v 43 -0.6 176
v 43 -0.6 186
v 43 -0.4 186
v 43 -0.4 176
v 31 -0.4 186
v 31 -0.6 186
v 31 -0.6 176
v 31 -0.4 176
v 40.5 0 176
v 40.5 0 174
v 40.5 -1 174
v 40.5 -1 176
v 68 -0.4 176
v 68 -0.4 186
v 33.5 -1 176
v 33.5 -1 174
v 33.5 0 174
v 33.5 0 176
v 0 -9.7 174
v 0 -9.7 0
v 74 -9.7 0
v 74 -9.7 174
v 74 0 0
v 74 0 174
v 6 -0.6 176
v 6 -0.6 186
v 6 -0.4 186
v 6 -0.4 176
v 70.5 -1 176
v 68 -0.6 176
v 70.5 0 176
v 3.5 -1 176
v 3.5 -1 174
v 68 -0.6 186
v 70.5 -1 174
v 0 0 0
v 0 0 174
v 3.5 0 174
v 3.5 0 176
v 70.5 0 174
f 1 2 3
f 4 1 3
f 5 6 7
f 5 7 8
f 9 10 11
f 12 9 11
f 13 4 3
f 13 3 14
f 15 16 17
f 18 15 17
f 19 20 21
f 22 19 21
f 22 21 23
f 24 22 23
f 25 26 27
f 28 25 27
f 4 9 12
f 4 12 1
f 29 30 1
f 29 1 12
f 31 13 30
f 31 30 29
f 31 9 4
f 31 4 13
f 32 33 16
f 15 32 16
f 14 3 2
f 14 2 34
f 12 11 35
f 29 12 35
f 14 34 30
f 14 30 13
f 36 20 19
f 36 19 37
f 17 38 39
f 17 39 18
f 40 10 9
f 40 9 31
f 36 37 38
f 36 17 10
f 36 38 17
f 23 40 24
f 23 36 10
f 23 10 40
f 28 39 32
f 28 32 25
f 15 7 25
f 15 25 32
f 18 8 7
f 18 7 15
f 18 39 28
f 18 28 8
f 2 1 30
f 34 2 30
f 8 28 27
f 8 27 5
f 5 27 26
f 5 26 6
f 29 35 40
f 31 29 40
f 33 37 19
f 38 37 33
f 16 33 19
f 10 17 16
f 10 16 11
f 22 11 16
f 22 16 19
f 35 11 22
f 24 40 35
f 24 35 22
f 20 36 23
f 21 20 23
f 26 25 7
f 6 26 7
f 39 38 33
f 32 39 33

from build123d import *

# Parameters (mm, degrees)
SZKIC1_W                    = 74
SZKIC1_H                    = 9.7
DODANIE_WYCI_GNI_CIE1_DEPTH = 174
DODANIE_WYCI_GNI_CIE2_DEPTH = 2
SZKIC3_W                    = 25
SZKIC3_H                    = 0.2
DODANIE_WYCI_GNI_CIE3_DEPTH = 10
SZKIC4_W                    = 25
SZKIC4_H                    = 0.2
DODANIE_WYCI_GNI_CIE4_DEPTH = 10


with BuildPart() as part:
    # Szkic1 → Dodanie-wyciągnięcie1 (new body)
    with BuildSketch(Plane.XY):
        with Locations((37, -4.85)):
            Rectangle(SZKIC1_W, SZKIC1_H)
    extrude(amount=DODANIE_WYCI_GNI_CIE1_DEPTH)

    # Szkic2 → Dodanie-wyciągnięcie2 (add)
    with BuildSketch(Plane.XY.offset(174)):
        Polygon((3.5, 0), (3.5, -1), (33.5, -1), (33.5, 0), (18.5, 0), align=None)
        Polygon((40.5, 0), (40.5, -1), (70.5, -1), (70.5, 0), (55.5, 0), align=None)
    extrude(amount=DODANIE_WYCI_GNI_CIE2_DEPTH)

    # Szkic3 → Dodanie-wyciągnięcie3 (add)
    with BuildSketch(Plane.XY.offset(176)):
        with Locations((18.5, -0.5)):
            Rectangle(SZKIC3_W, SZKIC3_H)
    extrude(amount=DODANIE_WYCI_GNI_CIE3_DEPTH)

    # Szkic4 → Dodanie-wyciągnięcie4 (add)
    with BuildSketch(Plane.XY.offset(176)):
        with Locations((55.5, -0.5)):
            Rectangle(SZKIC4_W, SZKIC4_H)
    extrude(amount=DODANIE_WYCI_GNI_CIE4_DEPTH)


solid = part.part
